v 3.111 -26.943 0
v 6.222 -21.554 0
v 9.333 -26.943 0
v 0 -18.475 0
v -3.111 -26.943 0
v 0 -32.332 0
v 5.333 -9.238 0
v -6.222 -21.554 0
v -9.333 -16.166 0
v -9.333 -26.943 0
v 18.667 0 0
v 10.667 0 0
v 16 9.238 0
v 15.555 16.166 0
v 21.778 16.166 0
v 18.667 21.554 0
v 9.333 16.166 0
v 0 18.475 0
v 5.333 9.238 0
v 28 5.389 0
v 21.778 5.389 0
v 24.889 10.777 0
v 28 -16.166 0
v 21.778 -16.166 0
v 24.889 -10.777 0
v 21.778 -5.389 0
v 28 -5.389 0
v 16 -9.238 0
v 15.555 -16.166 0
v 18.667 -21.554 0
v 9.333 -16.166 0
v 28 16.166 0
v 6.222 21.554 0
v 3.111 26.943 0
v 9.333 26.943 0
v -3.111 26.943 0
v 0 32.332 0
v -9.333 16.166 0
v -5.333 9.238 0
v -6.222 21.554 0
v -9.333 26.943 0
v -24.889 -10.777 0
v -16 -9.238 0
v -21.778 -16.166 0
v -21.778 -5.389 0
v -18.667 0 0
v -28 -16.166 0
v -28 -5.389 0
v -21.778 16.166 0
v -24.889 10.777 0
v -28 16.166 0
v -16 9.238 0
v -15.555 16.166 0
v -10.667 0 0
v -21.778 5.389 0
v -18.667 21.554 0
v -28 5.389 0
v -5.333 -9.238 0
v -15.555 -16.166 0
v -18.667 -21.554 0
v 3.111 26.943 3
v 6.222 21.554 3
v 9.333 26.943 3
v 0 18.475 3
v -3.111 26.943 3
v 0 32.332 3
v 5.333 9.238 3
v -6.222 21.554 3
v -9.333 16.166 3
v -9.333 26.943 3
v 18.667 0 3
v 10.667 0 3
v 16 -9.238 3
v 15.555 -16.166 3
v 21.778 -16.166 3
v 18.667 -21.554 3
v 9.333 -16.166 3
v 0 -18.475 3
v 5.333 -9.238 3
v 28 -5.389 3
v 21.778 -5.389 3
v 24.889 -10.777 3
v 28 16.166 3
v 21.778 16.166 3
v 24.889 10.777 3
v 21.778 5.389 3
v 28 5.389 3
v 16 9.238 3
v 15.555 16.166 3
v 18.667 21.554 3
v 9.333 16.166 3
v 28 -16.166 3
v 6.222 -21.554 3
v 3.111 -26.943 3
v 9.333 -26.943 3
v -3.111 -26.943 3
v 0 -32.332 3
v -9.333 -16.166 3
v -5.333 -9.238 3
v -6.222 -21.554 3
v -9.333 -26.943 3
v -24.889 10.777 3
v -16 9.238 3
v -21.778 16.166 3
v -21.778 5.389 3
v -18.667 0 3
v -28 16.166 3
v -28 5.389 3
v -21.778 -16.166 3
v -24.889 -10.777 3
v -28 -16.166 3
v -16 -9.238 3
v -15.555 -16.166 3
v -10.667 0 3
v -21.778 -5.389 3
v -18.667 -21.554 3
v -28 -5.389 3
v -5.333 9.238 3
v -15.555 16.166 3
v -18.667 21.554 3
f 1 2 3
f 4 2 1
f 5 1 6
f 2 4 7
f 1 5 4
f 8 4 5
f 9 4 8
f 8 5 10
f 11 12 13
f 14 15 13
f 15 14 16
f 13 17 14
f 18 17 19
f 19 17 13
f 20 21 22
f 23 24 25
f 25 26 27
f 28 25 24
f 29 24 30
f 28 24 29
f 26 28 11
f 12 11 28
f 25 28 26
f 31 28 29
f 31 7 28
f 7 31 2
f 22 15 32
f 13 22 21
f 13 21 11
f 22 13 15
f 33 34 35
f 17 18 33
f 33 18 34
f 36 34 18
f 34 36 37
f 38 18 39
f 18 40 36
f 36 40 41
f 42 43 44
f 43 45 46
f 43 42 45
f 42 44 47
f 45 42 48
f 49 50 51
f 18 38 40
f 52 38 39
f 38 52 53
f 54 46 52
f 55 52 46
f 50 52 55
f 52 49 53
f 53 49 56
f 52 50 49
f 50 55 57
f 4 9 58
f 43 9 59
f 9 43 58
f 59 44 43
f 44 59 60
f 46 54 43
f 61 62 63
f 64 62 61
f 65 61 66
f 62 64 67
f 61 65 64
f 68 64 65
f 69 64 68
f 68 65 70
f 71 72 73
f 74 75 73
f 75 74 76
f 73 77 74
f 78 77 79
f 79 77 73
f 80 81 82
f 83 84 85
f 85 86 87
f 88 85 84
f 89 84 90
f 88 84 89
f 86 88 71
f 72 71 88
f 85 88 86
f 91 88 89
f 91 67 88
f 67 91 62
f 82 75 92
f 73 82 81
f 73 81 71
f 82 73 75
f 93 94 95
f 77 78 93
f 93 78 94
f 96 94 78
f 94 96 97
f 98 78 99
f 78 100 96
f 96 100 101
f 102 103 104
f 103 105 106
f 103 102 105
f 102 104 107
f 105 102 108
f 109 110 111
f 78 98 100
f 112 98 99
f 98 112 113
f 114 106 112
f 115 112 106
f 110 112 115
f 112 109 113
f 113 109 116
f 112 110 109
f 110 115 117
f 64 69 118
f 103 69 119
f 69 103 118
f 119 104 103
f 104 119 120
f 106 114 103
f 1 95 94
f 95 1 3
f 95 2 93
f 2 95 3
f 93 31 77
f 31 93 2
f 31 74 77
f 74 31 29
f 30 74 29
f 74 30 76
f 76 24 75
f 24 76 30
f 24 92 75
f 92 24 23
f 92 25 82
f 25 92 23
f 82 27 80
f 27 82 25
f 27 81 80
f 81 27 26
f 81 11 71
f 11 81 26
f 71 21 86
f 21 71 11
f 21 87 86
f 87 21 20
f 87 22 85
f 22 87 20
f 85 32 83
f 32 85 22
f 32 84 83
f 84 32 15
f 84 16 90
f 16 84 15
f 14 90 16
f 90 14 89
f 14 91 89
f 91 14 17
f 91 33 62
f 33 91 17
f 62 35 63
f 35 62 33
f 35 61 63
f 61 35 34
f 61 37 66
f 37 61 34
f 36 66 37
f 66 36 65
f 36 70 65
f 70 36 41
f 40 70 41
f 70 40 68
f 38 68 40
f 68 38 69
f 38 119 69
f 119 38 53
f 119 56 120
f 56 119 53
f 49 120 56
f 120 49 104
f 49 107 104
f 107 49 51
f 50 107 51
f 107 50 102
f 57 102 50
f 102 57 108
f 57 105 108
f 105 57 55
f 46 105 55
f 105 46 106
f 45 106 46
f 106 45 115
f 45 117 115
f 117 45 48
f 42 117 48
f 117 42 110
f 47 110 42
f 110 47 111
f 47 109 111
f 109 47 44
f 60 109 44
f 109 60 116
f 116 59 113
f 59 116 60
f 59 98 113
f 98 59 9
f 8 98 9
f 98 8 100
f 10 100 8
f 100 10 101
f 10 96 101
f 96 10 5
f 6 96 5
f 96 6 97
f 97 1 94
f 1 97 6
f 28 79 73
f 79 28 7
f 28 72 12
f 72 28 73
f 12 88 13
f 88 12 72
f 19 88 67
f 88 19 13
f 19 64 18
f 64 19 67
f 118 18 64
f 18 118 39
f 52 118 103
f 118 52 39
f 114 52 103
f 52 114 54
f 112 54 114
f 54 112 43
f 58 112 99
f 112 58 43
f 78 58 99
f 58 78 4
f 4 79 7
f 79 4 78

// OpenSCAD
scale([.5,.5,1])

difference()
{
koch_two_snowflake(7,3);
translate([0,0,-1])
koch_one_snowflake(4,5);
}





module koch_one_snowflake(sc,ht)
{
scale ([sc,sc,1])
linear_extrude(height=ht)
polygon
       (points = [
          [ 8.00000,-4.61880],[ 2.66667,-4.61880],[ 2.66667,-4.61880],[ 0.00000,-9.23760],[ 0.00000,-9.23760],
          [-2.66667,-4.61880],[-2.66667,-4.61880],[-8.00000,-4.61880],[-8.00000,-4.61880],[-5.33333, 0.00000],
          [-5.33333, 0.00000],[-8.00000, 4.61880],[-8.00000, 4.61880],[-2.66667, 4.61880],[-2.66667, 4.61880],
          [ 0.00000, 9.23760],[ 0.00000, 9.23760],[ 2.66667, 4.61880],[ 2.66667, 4.61880],[ 8.00000, 4.61880],
          [ 8.00000, 4.61880],[ 5.33333, 0.00000],[ 5.33333, 0.00000],[ 8.00000,-4.61880],
                ]
      );
}


module koch_two_snowflake(sc,ht)
{
 scale([sc,sc,1])
 linear_extrude(height=ht)
polygon
       (points = [
          [ 8.00000,-4.61880],[ 6.22222,-4.61880],[ 6.22222,-4.61880],[ 5.33333,-6.15840],[ 5.33333,-6.15840],
          [ 4.44444,-4.61880],[ 4.44444,-4.61880],[ 2.66667,-4.61880],[ 2.66667,-4.61880],[ 1.77778,-6.15840],
          [ 1.77778,-6.15840],[ 2.66667,-7.69800],[ 2.66667,-7.69800],[ 0.88889,-7.69800],[ 0.88889,-7.69800],
          [-0.00000,-9.23760],[-0.00000,-9.23760],[-0.88889,-7.69800],[-0.88889,-7.69800],[-2.66667,-7.69800],
          [-2.66667,-7.69800],[-1.77778,-6.15840],[-1.77778,-6.15840],[-2.66667,-4.61880],[-2.66667,-4.61880],
          [-4.44444,-4.61880],[-4.44444,-4.61880],[-5.33333,-6.15840],[-5.33333,-6.15840],[-6.22222,-4.61880],
          [-6.22222,-4.61880],[-8.00000,-4.61880],[-8.00000,-4.61880],[-7.11111,-3.07920],[-7.11111,-3.07920],
          [-8.00000,-1.53960],[-8.00000,-1.53960],[-6.22222,-1.53960],[-6.22222,-1.53960],[-5.33333,-0.00000],
          [-5.33333,-0.00000],[-6.22222, 1.53960],[-6.22222, 1.53960],[-8.00000, 1.53960],[-8.00000, 1.53960],
          [-7.11111, 3.07920],[-7.11111, 3.07920],[-8.00000, 4.61880],[-8.00000, 4.61880],[-6.22222, 4.61880],
          [-6.22222, 4.61880],[-5.33333, 6.15840],[-5.33333, 6.15840],[-4.44444, 4.61880],[-4.44444, 4.61880],
          [-2.66667, 4.61880],[-2.66667, 4.61880],[-1.77778, 6.15840],[-1.77778, 6.15840],[-2.66667, 7.69800],
          [-2.66667, 7.69800],[-0.88889, 7.69800],[-0.88889, 7.69800],[-0.00000, 9.23760],[-0.00000, 9.23760],
          [ 0.88889, 7.69800],[ 0.88889, 7.69800],[ 2.66667, 7.69800],[ 2.66667, 7.69800],[ 1.77778, 6.15840],
          [ 1.77778, 6.15840],[ 2.66667, 4.61880],[ 2.66667, 4.61880],[ 4.44444, 4.61880],[ 4.44444, 4.61880],
          [ 5.33333, 6.15840],[ 5.33333, 6.15840],[ 6.22222, 4.61880],[ 6.22222, 4.61880],[ 8.00000, 4.61880],
          [ 8.00000, 4.61880],[ 7.11111, 3.07920],[ 7.11111, 3.07920],[ 8.00000, 1.53960],[ 8.00000, 1.53960],
          [ 6.22222, 1.53960],[ 6.22222, 1.53960],[ 5.33333,-0.00000],[ 5.33333,-0.00000],[ 6.22222,-1.53960],
          [ 6.22222,-1.53960],[ 8.00000,-1.53960],[ 8.00000,-1.53960],[ 7.11111,-3.07920],[ 7.11111,-3.07920],
          [ 8.00000,-4.61880],
                ]
      );
}





  module koch_three_snowflake(sc,ht)
{
 scale ([sc,sc,1])
 linear_extrude(height=ht)

polygon
       (points = [
          [ 8.00000,-4.61880],[ 7.40741,-4.61880],[ 7.40741,-4.61880],[ 7.11111,-5.13200],[ 7.11111,-5.13200],
          [ 6.81482,-4.61880],[ 6.81482,-4.61880],[ 6.22222,-4.61880],[ 6.22222,-4.61880],[ 5.92593,-5.13200],
          [ 5.92593,-5.13200],[ 6.22222,-5.64520],[ 6.22222,-5.64520],[ 5.62963,-5.64520],[ 5.62963,-5.64520],
          [ 5.33333,-6.15840],[ 5.33333,-6.15840],[ 5.03704,-5.64520],[ 5.03704,-5.64520],[ 4.44444,-5.64520],
          [ 4.44444,-5.64520],[ 4.74074,-5.13200],[ 4.74074,-5.13200],[ 4.44444,-4.61880],[ 4.44444,-4.61880],
          [ 3.85185,-4.61880],[ 3.85185,-4.61880],[ 3.55556,-5.13200],[ 3.55556,-5.13200],[ 3.25926,-4.61880],
          [ 3.25926,-4.61880],[ 2.66667,-4.61880],[ 2.66667,-4.61880],[ 2.37037,-5.13200],[ 2.37037,-5.13200],
          [ 2.66667,-5.64520],[ 2.66667,-5.64520],[ 2.07407,-5.64520],[ 2.07407,-5.64520],[ 1.77778,-6.15840],
          [ 1.77778,-6.15840],[ 2.07407,-6.67160],[ 2.07407,-6.67160],[ 2.66667,-6.67160],[ 2.66667,-6.67160],
          [ 2.37037,-7.18480],[ 2.37037,-7.18480],[ 2.66667,-7.69800],[ 2.66667,-7.69800],[ 2.07407,-7.69800],
          [ 2.07407,-7.69800],[ 1.77778,-8.21120],[ 1.77778,-8.21120],[ 1.48148,-7.69800],[ 1.48148,-7.69800],
          [ 0.88889,-7.69800],[ 0.88889,-7.69800],[ 0.59259,-8.21120],[ 0.59259,-8.21120],[ 0.88889,-8.72440],
          [ 0.88889,-8.72440],[ 0.29630,-8.72440],[ 0.29630,-8.72440],[ 0.00000,-9.23760],[ 0.00000,-9.23760],
          [-0.29630,-8.72440],[-0.29630,-8.72440],[-0.88889,-8.72440],[-0.88889,-8.72440],[-0.59259,-8.21120],
          [-0.59259,-8.21120],[-0.88889,-7.69800],[-0.88889,-7.69800],[-1.48148,-7.69800],[-1.48148,-7.69800],
          [-1.77778,-8.21120],[-1.77778,-8.21120],[-2.07407,-7.69800],[-2.07407,-7.69800],[-2.66667,-7.69800],
          [-2.66667,-7.69800],[-2.37037,-7.18480],[-2.37037,-7.18480],[-2.66667,-6.67160],[-2.66667,-6.67160],
          [-2.07407,-6.67160],[-2.07407,-6.67160],[-1.77778,-6.15840],[-1.77778,-6.15840],[-2.07407,-5.64520],
          [-2.07407,-5.64520],[-2.66667,-5.64520],[-2.66667,-5.64520],[-2.37037,-5.13200],[-2.37037,-5.13200],
          [-2.66667,-4.61880],[-2.66667,-4.61880],[-3.25926,-4.61880],[-3.25926,-4.61880],[-3.55556,-5.13200],
          [-3.55556,-5.13200],[-3.85185,-4.61880],[-3.85185,-4.61880],[-4.44444,-4.61880],[-4.44444,-4.61880],
          [-4.74074,-5.13200],[-4.74074,-5.13200],[-4.44444,-5.64520],[-4.44444,-5.64520],[-5.03704,-5.64520],
          [-5.03704,-5.64520],[-5.33333,-6.15840],[-5.33333,-6.15840],[-5.62963,-5.64520],[-5.62963,-5.64520],
          [-6.22222,-5.64520],[-6.22222,-5.64520],[-5.92593,-5.13200],[-5.92593,-5.13200],[-6.22222,-4.61880],
          [-6.22222,-4.61880],[-6.81482,-4.61880],[-6.81482,-4.61880],[-7.11111,-5.13200],[-7.11111,-5.13200],
          [-7.40741,-4.61880],[-7.40741,-4.61880],[-8.00000,-4.61880],[-8.00000,-4.61880],[-7.70370,-4.10560],
          [-7.70370,-4.10560],[-8.00000,-3.59240],[-8.00000,-3.59240],[-7.40741,-3.59240],[-7.40741,-3.59240],
          [-7.11111,-3.07920],[-7.11111,-3.07920],[-7.40741,-2.56600],[-7.40741,-2.56600],[-8.00000,-2.56600],
          [-8.00000,-2.56600],[-7.70370,-2.05280],[-7.70370,-2.05280],[-8.00000,-1.53960],[-8.00000,-1.53960],
          [-7.40741,-1.53960],[-7.40741,-1.53960],[-7.11111,-1.02640],[-7.11111,-1.02640],[-6.81482,-1.53960],
          [-6.81482,-1.53960],[-6.22222,-1.53960],[-6.22222,-1.53960],[-5.92593,-1.02640],[-5.92593,-1.02640],
          [-6.22222,-0.51320],[-6.22222,-0.51320],[-5.62963,-0.51320],[-5.62963,-0.51320],[-5.33333,-0.00000],
          [-5.33333,-0.00000],[-5.62963, 0.51320],[-5.62963, 0.51320],[-6.22222, 0.51320],[-6.22222, 0.51320],
          [-5.92593, 1.02640],[-5.92593, 1.02640],[-6.22222, 1.53960],[-6.22222, 1.53960],[-6.81482, 1.53960],
          [-6.81482, 1.53960],[-7.11111, 1.02640],[-7.11111, 1.02640],[-7.40741, 1.53960],[-7.40741, 1.53960],
          [-8.00000, 1.53960],[-8.00000, 1.53960],[-7.70370, 2.05280],[-7.70370, 2.05280],[-8.00000, 2.56600],
          [-8.00000, 2.56600],[-7.40741, 2.56600],[-7.40741, 2.56600],[-7.11111, 3.07920],[-7.11111, 3.07920],
          [-7.40741, 3.59240],[-7.40741, 3.59240],[-8.00000, 3.59240],[-8.00000, 3.59240],[-7.70370, 4.10560],
          [-7.70370, 4.10560],[-8.00000, 4.61880],[-8.00000, 4.61880],[-7.40741, 4.61880],[-7.40741, 4.61880],
          [-7.11111, 5.13200],[-7.11111, 5.13200],[-6.81482, 4.61880],[-6.81482, 4.61880],[-6.22222, 4.61880],
          [-6.22222, 4.61880],[-5.92593, 5.13200],[-5.92593, 5.13200],[-6.22222, 5.64520],[-6.22222, 5.64520],
          [-5.62963, 5.64520],[-5.62963, 5.64520],[-5.33333, 6.15840],[-5.33333, 6.15840],[-5.03704, 5.64520],
          [-5.03704, 5.64520],[-4.44445, 5.64520],[-4.44445, 5.64520],[-4.74074, 5.13200],[-4.74074, 5.13200],
          [-4.44444, 4.61880],[-4.44444, 4.61880],[-3.85185, 4.61880],[-3.85185, 4.61880],[-3.55556, 5.13200],
          [-3.55556, 5.13200],[-3.25926, 4.61880],[-3.25926, 4.61880],[-2.66667, 4.61880],[-2.66667, 4.61880],
          [-2.37037, 5.13200],[-2.37037, 5.13200],[-2.66667, 5.64520],[-2.66667, 5.64520],[-2.07407, 5.64520],
          [-2.07407, 5.64520],[-1.77778, 6.15840],[-1.77778, 6.15840],[-2.07407, 6.67160],[-2.07407, 6.67160],
          [-2.66667, 6.67160],[-2.66667, 6.67160],[-2.37037, 7.18480],[-2.37037, 7.18480],[-2.66667, 7.69800],
          [-2.66667, 7.69800],[-2.07407, 7.69800],[-2.07407, 7.69800],[-1.77778, 8.21120],[-1.77778, 8.21120],
          [-1.48148, 7.69800],[-1.48148, 7.69800],[-0.88889, 7.69800],[-0.88889, 7.69800],[-0.59259, 8.21120],
          [-0.59259, 8.21120],[-0.88889, 8.72440],[-0.88889, 8.72440],[-0.29630, 8.72440],[-0.29630, 8.72440],
          [ 0.00000, 9.23760],[ 0.00000, 9.23760],[ 0.29630, 8.72440],[ 0.29630, 8.72440],[ 0.88889, 8.72440],
          [ 0.88889, 8.72440],[ 0.59259, 8.21120],[ 0.59259, 8.21120],[ 0.88889, 7.69800],[ 0.88889, 7.69800],
          [ 1.48148, 7.69800],[ 1.48148, 7.69800],[ 1.77778, 8.21120],[ 1.77778, 8.21120],[ 2.07407, 7.69800],
          [ 2.07407, 7.69800],[ 2.66667, 7.69800],[ 2.66667, 7.69800],[ 2.37037, 7.18480],[ 2.37037, 7.18480],
          [ 2.66667, 6.67160],[ 2.66667, 6.67160],[ 2.07407, 6.67160],[ 2.07407, 6.67160],[ 1.77778, 6.15840],
          [ 1.77778, 6.15840],[ 2.07407, 5.64520],[ 2.07407, 5.64520],[ 2.66667, 5.64520],[ 2.66667, 5.64520],
          [ 2.37037, 5.13200],[ 2.37037, 5.13200],[ 2.66667, 4.61880],[ 2.66667, 4.61880],[ 3.25926, 4.61880],
          [ 3.25926, 4.61880],[ 3.55556, 5.13200],[ 3.55556, 5.13200],[ 3.85185, 4.61880],[ 3.85185, 4.61880],
          [ 4.44444, 4.61880],[ 4.44444, 4.61880],[ 4.74074, 5.13200],[ 4.74074, 5.13200],[ 4.44444, 5.64520],
          [ 4.44444, 5.64520],[ 5.03704, 5.64520],[ 5.03704, 5.64520],[ 5.33333, 6.15840],[ 5.33333, 6.15840],
          [ 5.62963, 5.64520],[ 5.62963, 5.64520],[ 6.22222, 5.64520],[ 6.22222, 5.64520],[ 5.92593, 5.13200],
          [ 5.92593, 5.13200],[ 6.22222, 4.61880],[ 6.22222, 4.61880],[ 6.81481, 4.61880],[ 6.81481, 4.61880],
          [ 7.11111, 5.13200],[ 7.11111, 5.13200],[ 7.40741, 4.61880],[ 7.40741, 4.61880],[ 8.00000, 4.61880],
          [ 8.00000, 4.61880],[ 7.70370, 4.10560],[ 7.70370, 4.10560],[ 8.00000, 3.59240],[ 8.00000, 3.59240],
          [ 7.40741, 3.59240],[ 7.40741, 3.59240],[ 7.11111, 3.07920],[ 7.11111, 3.07920],[ 7.40741, 2.56600],
          [ 7.40741, 2.56600],[ 8.00000, 2.56600],[ 8.00000, 2.56600],[ 7.70370, 2.05280],[ 7.70370, 2.05280],
          [ 8.00000, 1.53960],[ 8.00000, 1.53960],[ 7.40741, 1.53960],[ 7.40741, 1.53960],[ 7.11111, 1.02640],
          [ 7.11111, 1.02640],[ 6.81481, 1.53960],[ 6.81481, 1.53960],[ 6.22222, 1.53960],[ 6.22222, 1.53960],
          [ 5.92593, 1.02640],[ 5.92593, 1.02640],[ 6.22222, 0.51320],[ 6.22222, 0.51320],[ 5.62963, 0.51320],
          [ 5.62963, 0.51320],[ 5.33333,-0.00000],[ 5.33333,-0.00000],[ 5.62963,-0.51320],[ 5.62963,-0.51320],
          [ 6.22222,-0.51320],[ 6.22222,-0.51320],[ 5.92593,-1.02640],[ 5.92593,-1.02640],[ 6.22222,-1.53960],
          [ 6.22222,-1.53960],[ 6.81482,-1.53960],[ 6.81482,-1.53960],[ 7.11111,-1.02640],[ 7.11111,-1.02640],
          [ 7.40741,-1.53960],[ 7.40741,-1.53960],[ 8.00000,-1.53960],[ 8.00000,-1.53960],[ 7.70370,-2.05280],
          [ 7.70370,-2.05280],[ 8.00000,-2.56600],[ 8.00000,-2.56600],[ 7.40741,-2.56600],[ 7.40741,-2.56600],
          [ 7.11111,-3.07920],[ 7.11111,-3.07920],[ 7.40741,-3.59240],[ 7.40741,-3.59240],[ 8.00000,-3.59240],
          [ 8.00000,-3.59240],[ 7.70370,-4.10560],[ 7.70370,-4.10560],[ 8.00000,-4.61880],
                ]
      );
}
